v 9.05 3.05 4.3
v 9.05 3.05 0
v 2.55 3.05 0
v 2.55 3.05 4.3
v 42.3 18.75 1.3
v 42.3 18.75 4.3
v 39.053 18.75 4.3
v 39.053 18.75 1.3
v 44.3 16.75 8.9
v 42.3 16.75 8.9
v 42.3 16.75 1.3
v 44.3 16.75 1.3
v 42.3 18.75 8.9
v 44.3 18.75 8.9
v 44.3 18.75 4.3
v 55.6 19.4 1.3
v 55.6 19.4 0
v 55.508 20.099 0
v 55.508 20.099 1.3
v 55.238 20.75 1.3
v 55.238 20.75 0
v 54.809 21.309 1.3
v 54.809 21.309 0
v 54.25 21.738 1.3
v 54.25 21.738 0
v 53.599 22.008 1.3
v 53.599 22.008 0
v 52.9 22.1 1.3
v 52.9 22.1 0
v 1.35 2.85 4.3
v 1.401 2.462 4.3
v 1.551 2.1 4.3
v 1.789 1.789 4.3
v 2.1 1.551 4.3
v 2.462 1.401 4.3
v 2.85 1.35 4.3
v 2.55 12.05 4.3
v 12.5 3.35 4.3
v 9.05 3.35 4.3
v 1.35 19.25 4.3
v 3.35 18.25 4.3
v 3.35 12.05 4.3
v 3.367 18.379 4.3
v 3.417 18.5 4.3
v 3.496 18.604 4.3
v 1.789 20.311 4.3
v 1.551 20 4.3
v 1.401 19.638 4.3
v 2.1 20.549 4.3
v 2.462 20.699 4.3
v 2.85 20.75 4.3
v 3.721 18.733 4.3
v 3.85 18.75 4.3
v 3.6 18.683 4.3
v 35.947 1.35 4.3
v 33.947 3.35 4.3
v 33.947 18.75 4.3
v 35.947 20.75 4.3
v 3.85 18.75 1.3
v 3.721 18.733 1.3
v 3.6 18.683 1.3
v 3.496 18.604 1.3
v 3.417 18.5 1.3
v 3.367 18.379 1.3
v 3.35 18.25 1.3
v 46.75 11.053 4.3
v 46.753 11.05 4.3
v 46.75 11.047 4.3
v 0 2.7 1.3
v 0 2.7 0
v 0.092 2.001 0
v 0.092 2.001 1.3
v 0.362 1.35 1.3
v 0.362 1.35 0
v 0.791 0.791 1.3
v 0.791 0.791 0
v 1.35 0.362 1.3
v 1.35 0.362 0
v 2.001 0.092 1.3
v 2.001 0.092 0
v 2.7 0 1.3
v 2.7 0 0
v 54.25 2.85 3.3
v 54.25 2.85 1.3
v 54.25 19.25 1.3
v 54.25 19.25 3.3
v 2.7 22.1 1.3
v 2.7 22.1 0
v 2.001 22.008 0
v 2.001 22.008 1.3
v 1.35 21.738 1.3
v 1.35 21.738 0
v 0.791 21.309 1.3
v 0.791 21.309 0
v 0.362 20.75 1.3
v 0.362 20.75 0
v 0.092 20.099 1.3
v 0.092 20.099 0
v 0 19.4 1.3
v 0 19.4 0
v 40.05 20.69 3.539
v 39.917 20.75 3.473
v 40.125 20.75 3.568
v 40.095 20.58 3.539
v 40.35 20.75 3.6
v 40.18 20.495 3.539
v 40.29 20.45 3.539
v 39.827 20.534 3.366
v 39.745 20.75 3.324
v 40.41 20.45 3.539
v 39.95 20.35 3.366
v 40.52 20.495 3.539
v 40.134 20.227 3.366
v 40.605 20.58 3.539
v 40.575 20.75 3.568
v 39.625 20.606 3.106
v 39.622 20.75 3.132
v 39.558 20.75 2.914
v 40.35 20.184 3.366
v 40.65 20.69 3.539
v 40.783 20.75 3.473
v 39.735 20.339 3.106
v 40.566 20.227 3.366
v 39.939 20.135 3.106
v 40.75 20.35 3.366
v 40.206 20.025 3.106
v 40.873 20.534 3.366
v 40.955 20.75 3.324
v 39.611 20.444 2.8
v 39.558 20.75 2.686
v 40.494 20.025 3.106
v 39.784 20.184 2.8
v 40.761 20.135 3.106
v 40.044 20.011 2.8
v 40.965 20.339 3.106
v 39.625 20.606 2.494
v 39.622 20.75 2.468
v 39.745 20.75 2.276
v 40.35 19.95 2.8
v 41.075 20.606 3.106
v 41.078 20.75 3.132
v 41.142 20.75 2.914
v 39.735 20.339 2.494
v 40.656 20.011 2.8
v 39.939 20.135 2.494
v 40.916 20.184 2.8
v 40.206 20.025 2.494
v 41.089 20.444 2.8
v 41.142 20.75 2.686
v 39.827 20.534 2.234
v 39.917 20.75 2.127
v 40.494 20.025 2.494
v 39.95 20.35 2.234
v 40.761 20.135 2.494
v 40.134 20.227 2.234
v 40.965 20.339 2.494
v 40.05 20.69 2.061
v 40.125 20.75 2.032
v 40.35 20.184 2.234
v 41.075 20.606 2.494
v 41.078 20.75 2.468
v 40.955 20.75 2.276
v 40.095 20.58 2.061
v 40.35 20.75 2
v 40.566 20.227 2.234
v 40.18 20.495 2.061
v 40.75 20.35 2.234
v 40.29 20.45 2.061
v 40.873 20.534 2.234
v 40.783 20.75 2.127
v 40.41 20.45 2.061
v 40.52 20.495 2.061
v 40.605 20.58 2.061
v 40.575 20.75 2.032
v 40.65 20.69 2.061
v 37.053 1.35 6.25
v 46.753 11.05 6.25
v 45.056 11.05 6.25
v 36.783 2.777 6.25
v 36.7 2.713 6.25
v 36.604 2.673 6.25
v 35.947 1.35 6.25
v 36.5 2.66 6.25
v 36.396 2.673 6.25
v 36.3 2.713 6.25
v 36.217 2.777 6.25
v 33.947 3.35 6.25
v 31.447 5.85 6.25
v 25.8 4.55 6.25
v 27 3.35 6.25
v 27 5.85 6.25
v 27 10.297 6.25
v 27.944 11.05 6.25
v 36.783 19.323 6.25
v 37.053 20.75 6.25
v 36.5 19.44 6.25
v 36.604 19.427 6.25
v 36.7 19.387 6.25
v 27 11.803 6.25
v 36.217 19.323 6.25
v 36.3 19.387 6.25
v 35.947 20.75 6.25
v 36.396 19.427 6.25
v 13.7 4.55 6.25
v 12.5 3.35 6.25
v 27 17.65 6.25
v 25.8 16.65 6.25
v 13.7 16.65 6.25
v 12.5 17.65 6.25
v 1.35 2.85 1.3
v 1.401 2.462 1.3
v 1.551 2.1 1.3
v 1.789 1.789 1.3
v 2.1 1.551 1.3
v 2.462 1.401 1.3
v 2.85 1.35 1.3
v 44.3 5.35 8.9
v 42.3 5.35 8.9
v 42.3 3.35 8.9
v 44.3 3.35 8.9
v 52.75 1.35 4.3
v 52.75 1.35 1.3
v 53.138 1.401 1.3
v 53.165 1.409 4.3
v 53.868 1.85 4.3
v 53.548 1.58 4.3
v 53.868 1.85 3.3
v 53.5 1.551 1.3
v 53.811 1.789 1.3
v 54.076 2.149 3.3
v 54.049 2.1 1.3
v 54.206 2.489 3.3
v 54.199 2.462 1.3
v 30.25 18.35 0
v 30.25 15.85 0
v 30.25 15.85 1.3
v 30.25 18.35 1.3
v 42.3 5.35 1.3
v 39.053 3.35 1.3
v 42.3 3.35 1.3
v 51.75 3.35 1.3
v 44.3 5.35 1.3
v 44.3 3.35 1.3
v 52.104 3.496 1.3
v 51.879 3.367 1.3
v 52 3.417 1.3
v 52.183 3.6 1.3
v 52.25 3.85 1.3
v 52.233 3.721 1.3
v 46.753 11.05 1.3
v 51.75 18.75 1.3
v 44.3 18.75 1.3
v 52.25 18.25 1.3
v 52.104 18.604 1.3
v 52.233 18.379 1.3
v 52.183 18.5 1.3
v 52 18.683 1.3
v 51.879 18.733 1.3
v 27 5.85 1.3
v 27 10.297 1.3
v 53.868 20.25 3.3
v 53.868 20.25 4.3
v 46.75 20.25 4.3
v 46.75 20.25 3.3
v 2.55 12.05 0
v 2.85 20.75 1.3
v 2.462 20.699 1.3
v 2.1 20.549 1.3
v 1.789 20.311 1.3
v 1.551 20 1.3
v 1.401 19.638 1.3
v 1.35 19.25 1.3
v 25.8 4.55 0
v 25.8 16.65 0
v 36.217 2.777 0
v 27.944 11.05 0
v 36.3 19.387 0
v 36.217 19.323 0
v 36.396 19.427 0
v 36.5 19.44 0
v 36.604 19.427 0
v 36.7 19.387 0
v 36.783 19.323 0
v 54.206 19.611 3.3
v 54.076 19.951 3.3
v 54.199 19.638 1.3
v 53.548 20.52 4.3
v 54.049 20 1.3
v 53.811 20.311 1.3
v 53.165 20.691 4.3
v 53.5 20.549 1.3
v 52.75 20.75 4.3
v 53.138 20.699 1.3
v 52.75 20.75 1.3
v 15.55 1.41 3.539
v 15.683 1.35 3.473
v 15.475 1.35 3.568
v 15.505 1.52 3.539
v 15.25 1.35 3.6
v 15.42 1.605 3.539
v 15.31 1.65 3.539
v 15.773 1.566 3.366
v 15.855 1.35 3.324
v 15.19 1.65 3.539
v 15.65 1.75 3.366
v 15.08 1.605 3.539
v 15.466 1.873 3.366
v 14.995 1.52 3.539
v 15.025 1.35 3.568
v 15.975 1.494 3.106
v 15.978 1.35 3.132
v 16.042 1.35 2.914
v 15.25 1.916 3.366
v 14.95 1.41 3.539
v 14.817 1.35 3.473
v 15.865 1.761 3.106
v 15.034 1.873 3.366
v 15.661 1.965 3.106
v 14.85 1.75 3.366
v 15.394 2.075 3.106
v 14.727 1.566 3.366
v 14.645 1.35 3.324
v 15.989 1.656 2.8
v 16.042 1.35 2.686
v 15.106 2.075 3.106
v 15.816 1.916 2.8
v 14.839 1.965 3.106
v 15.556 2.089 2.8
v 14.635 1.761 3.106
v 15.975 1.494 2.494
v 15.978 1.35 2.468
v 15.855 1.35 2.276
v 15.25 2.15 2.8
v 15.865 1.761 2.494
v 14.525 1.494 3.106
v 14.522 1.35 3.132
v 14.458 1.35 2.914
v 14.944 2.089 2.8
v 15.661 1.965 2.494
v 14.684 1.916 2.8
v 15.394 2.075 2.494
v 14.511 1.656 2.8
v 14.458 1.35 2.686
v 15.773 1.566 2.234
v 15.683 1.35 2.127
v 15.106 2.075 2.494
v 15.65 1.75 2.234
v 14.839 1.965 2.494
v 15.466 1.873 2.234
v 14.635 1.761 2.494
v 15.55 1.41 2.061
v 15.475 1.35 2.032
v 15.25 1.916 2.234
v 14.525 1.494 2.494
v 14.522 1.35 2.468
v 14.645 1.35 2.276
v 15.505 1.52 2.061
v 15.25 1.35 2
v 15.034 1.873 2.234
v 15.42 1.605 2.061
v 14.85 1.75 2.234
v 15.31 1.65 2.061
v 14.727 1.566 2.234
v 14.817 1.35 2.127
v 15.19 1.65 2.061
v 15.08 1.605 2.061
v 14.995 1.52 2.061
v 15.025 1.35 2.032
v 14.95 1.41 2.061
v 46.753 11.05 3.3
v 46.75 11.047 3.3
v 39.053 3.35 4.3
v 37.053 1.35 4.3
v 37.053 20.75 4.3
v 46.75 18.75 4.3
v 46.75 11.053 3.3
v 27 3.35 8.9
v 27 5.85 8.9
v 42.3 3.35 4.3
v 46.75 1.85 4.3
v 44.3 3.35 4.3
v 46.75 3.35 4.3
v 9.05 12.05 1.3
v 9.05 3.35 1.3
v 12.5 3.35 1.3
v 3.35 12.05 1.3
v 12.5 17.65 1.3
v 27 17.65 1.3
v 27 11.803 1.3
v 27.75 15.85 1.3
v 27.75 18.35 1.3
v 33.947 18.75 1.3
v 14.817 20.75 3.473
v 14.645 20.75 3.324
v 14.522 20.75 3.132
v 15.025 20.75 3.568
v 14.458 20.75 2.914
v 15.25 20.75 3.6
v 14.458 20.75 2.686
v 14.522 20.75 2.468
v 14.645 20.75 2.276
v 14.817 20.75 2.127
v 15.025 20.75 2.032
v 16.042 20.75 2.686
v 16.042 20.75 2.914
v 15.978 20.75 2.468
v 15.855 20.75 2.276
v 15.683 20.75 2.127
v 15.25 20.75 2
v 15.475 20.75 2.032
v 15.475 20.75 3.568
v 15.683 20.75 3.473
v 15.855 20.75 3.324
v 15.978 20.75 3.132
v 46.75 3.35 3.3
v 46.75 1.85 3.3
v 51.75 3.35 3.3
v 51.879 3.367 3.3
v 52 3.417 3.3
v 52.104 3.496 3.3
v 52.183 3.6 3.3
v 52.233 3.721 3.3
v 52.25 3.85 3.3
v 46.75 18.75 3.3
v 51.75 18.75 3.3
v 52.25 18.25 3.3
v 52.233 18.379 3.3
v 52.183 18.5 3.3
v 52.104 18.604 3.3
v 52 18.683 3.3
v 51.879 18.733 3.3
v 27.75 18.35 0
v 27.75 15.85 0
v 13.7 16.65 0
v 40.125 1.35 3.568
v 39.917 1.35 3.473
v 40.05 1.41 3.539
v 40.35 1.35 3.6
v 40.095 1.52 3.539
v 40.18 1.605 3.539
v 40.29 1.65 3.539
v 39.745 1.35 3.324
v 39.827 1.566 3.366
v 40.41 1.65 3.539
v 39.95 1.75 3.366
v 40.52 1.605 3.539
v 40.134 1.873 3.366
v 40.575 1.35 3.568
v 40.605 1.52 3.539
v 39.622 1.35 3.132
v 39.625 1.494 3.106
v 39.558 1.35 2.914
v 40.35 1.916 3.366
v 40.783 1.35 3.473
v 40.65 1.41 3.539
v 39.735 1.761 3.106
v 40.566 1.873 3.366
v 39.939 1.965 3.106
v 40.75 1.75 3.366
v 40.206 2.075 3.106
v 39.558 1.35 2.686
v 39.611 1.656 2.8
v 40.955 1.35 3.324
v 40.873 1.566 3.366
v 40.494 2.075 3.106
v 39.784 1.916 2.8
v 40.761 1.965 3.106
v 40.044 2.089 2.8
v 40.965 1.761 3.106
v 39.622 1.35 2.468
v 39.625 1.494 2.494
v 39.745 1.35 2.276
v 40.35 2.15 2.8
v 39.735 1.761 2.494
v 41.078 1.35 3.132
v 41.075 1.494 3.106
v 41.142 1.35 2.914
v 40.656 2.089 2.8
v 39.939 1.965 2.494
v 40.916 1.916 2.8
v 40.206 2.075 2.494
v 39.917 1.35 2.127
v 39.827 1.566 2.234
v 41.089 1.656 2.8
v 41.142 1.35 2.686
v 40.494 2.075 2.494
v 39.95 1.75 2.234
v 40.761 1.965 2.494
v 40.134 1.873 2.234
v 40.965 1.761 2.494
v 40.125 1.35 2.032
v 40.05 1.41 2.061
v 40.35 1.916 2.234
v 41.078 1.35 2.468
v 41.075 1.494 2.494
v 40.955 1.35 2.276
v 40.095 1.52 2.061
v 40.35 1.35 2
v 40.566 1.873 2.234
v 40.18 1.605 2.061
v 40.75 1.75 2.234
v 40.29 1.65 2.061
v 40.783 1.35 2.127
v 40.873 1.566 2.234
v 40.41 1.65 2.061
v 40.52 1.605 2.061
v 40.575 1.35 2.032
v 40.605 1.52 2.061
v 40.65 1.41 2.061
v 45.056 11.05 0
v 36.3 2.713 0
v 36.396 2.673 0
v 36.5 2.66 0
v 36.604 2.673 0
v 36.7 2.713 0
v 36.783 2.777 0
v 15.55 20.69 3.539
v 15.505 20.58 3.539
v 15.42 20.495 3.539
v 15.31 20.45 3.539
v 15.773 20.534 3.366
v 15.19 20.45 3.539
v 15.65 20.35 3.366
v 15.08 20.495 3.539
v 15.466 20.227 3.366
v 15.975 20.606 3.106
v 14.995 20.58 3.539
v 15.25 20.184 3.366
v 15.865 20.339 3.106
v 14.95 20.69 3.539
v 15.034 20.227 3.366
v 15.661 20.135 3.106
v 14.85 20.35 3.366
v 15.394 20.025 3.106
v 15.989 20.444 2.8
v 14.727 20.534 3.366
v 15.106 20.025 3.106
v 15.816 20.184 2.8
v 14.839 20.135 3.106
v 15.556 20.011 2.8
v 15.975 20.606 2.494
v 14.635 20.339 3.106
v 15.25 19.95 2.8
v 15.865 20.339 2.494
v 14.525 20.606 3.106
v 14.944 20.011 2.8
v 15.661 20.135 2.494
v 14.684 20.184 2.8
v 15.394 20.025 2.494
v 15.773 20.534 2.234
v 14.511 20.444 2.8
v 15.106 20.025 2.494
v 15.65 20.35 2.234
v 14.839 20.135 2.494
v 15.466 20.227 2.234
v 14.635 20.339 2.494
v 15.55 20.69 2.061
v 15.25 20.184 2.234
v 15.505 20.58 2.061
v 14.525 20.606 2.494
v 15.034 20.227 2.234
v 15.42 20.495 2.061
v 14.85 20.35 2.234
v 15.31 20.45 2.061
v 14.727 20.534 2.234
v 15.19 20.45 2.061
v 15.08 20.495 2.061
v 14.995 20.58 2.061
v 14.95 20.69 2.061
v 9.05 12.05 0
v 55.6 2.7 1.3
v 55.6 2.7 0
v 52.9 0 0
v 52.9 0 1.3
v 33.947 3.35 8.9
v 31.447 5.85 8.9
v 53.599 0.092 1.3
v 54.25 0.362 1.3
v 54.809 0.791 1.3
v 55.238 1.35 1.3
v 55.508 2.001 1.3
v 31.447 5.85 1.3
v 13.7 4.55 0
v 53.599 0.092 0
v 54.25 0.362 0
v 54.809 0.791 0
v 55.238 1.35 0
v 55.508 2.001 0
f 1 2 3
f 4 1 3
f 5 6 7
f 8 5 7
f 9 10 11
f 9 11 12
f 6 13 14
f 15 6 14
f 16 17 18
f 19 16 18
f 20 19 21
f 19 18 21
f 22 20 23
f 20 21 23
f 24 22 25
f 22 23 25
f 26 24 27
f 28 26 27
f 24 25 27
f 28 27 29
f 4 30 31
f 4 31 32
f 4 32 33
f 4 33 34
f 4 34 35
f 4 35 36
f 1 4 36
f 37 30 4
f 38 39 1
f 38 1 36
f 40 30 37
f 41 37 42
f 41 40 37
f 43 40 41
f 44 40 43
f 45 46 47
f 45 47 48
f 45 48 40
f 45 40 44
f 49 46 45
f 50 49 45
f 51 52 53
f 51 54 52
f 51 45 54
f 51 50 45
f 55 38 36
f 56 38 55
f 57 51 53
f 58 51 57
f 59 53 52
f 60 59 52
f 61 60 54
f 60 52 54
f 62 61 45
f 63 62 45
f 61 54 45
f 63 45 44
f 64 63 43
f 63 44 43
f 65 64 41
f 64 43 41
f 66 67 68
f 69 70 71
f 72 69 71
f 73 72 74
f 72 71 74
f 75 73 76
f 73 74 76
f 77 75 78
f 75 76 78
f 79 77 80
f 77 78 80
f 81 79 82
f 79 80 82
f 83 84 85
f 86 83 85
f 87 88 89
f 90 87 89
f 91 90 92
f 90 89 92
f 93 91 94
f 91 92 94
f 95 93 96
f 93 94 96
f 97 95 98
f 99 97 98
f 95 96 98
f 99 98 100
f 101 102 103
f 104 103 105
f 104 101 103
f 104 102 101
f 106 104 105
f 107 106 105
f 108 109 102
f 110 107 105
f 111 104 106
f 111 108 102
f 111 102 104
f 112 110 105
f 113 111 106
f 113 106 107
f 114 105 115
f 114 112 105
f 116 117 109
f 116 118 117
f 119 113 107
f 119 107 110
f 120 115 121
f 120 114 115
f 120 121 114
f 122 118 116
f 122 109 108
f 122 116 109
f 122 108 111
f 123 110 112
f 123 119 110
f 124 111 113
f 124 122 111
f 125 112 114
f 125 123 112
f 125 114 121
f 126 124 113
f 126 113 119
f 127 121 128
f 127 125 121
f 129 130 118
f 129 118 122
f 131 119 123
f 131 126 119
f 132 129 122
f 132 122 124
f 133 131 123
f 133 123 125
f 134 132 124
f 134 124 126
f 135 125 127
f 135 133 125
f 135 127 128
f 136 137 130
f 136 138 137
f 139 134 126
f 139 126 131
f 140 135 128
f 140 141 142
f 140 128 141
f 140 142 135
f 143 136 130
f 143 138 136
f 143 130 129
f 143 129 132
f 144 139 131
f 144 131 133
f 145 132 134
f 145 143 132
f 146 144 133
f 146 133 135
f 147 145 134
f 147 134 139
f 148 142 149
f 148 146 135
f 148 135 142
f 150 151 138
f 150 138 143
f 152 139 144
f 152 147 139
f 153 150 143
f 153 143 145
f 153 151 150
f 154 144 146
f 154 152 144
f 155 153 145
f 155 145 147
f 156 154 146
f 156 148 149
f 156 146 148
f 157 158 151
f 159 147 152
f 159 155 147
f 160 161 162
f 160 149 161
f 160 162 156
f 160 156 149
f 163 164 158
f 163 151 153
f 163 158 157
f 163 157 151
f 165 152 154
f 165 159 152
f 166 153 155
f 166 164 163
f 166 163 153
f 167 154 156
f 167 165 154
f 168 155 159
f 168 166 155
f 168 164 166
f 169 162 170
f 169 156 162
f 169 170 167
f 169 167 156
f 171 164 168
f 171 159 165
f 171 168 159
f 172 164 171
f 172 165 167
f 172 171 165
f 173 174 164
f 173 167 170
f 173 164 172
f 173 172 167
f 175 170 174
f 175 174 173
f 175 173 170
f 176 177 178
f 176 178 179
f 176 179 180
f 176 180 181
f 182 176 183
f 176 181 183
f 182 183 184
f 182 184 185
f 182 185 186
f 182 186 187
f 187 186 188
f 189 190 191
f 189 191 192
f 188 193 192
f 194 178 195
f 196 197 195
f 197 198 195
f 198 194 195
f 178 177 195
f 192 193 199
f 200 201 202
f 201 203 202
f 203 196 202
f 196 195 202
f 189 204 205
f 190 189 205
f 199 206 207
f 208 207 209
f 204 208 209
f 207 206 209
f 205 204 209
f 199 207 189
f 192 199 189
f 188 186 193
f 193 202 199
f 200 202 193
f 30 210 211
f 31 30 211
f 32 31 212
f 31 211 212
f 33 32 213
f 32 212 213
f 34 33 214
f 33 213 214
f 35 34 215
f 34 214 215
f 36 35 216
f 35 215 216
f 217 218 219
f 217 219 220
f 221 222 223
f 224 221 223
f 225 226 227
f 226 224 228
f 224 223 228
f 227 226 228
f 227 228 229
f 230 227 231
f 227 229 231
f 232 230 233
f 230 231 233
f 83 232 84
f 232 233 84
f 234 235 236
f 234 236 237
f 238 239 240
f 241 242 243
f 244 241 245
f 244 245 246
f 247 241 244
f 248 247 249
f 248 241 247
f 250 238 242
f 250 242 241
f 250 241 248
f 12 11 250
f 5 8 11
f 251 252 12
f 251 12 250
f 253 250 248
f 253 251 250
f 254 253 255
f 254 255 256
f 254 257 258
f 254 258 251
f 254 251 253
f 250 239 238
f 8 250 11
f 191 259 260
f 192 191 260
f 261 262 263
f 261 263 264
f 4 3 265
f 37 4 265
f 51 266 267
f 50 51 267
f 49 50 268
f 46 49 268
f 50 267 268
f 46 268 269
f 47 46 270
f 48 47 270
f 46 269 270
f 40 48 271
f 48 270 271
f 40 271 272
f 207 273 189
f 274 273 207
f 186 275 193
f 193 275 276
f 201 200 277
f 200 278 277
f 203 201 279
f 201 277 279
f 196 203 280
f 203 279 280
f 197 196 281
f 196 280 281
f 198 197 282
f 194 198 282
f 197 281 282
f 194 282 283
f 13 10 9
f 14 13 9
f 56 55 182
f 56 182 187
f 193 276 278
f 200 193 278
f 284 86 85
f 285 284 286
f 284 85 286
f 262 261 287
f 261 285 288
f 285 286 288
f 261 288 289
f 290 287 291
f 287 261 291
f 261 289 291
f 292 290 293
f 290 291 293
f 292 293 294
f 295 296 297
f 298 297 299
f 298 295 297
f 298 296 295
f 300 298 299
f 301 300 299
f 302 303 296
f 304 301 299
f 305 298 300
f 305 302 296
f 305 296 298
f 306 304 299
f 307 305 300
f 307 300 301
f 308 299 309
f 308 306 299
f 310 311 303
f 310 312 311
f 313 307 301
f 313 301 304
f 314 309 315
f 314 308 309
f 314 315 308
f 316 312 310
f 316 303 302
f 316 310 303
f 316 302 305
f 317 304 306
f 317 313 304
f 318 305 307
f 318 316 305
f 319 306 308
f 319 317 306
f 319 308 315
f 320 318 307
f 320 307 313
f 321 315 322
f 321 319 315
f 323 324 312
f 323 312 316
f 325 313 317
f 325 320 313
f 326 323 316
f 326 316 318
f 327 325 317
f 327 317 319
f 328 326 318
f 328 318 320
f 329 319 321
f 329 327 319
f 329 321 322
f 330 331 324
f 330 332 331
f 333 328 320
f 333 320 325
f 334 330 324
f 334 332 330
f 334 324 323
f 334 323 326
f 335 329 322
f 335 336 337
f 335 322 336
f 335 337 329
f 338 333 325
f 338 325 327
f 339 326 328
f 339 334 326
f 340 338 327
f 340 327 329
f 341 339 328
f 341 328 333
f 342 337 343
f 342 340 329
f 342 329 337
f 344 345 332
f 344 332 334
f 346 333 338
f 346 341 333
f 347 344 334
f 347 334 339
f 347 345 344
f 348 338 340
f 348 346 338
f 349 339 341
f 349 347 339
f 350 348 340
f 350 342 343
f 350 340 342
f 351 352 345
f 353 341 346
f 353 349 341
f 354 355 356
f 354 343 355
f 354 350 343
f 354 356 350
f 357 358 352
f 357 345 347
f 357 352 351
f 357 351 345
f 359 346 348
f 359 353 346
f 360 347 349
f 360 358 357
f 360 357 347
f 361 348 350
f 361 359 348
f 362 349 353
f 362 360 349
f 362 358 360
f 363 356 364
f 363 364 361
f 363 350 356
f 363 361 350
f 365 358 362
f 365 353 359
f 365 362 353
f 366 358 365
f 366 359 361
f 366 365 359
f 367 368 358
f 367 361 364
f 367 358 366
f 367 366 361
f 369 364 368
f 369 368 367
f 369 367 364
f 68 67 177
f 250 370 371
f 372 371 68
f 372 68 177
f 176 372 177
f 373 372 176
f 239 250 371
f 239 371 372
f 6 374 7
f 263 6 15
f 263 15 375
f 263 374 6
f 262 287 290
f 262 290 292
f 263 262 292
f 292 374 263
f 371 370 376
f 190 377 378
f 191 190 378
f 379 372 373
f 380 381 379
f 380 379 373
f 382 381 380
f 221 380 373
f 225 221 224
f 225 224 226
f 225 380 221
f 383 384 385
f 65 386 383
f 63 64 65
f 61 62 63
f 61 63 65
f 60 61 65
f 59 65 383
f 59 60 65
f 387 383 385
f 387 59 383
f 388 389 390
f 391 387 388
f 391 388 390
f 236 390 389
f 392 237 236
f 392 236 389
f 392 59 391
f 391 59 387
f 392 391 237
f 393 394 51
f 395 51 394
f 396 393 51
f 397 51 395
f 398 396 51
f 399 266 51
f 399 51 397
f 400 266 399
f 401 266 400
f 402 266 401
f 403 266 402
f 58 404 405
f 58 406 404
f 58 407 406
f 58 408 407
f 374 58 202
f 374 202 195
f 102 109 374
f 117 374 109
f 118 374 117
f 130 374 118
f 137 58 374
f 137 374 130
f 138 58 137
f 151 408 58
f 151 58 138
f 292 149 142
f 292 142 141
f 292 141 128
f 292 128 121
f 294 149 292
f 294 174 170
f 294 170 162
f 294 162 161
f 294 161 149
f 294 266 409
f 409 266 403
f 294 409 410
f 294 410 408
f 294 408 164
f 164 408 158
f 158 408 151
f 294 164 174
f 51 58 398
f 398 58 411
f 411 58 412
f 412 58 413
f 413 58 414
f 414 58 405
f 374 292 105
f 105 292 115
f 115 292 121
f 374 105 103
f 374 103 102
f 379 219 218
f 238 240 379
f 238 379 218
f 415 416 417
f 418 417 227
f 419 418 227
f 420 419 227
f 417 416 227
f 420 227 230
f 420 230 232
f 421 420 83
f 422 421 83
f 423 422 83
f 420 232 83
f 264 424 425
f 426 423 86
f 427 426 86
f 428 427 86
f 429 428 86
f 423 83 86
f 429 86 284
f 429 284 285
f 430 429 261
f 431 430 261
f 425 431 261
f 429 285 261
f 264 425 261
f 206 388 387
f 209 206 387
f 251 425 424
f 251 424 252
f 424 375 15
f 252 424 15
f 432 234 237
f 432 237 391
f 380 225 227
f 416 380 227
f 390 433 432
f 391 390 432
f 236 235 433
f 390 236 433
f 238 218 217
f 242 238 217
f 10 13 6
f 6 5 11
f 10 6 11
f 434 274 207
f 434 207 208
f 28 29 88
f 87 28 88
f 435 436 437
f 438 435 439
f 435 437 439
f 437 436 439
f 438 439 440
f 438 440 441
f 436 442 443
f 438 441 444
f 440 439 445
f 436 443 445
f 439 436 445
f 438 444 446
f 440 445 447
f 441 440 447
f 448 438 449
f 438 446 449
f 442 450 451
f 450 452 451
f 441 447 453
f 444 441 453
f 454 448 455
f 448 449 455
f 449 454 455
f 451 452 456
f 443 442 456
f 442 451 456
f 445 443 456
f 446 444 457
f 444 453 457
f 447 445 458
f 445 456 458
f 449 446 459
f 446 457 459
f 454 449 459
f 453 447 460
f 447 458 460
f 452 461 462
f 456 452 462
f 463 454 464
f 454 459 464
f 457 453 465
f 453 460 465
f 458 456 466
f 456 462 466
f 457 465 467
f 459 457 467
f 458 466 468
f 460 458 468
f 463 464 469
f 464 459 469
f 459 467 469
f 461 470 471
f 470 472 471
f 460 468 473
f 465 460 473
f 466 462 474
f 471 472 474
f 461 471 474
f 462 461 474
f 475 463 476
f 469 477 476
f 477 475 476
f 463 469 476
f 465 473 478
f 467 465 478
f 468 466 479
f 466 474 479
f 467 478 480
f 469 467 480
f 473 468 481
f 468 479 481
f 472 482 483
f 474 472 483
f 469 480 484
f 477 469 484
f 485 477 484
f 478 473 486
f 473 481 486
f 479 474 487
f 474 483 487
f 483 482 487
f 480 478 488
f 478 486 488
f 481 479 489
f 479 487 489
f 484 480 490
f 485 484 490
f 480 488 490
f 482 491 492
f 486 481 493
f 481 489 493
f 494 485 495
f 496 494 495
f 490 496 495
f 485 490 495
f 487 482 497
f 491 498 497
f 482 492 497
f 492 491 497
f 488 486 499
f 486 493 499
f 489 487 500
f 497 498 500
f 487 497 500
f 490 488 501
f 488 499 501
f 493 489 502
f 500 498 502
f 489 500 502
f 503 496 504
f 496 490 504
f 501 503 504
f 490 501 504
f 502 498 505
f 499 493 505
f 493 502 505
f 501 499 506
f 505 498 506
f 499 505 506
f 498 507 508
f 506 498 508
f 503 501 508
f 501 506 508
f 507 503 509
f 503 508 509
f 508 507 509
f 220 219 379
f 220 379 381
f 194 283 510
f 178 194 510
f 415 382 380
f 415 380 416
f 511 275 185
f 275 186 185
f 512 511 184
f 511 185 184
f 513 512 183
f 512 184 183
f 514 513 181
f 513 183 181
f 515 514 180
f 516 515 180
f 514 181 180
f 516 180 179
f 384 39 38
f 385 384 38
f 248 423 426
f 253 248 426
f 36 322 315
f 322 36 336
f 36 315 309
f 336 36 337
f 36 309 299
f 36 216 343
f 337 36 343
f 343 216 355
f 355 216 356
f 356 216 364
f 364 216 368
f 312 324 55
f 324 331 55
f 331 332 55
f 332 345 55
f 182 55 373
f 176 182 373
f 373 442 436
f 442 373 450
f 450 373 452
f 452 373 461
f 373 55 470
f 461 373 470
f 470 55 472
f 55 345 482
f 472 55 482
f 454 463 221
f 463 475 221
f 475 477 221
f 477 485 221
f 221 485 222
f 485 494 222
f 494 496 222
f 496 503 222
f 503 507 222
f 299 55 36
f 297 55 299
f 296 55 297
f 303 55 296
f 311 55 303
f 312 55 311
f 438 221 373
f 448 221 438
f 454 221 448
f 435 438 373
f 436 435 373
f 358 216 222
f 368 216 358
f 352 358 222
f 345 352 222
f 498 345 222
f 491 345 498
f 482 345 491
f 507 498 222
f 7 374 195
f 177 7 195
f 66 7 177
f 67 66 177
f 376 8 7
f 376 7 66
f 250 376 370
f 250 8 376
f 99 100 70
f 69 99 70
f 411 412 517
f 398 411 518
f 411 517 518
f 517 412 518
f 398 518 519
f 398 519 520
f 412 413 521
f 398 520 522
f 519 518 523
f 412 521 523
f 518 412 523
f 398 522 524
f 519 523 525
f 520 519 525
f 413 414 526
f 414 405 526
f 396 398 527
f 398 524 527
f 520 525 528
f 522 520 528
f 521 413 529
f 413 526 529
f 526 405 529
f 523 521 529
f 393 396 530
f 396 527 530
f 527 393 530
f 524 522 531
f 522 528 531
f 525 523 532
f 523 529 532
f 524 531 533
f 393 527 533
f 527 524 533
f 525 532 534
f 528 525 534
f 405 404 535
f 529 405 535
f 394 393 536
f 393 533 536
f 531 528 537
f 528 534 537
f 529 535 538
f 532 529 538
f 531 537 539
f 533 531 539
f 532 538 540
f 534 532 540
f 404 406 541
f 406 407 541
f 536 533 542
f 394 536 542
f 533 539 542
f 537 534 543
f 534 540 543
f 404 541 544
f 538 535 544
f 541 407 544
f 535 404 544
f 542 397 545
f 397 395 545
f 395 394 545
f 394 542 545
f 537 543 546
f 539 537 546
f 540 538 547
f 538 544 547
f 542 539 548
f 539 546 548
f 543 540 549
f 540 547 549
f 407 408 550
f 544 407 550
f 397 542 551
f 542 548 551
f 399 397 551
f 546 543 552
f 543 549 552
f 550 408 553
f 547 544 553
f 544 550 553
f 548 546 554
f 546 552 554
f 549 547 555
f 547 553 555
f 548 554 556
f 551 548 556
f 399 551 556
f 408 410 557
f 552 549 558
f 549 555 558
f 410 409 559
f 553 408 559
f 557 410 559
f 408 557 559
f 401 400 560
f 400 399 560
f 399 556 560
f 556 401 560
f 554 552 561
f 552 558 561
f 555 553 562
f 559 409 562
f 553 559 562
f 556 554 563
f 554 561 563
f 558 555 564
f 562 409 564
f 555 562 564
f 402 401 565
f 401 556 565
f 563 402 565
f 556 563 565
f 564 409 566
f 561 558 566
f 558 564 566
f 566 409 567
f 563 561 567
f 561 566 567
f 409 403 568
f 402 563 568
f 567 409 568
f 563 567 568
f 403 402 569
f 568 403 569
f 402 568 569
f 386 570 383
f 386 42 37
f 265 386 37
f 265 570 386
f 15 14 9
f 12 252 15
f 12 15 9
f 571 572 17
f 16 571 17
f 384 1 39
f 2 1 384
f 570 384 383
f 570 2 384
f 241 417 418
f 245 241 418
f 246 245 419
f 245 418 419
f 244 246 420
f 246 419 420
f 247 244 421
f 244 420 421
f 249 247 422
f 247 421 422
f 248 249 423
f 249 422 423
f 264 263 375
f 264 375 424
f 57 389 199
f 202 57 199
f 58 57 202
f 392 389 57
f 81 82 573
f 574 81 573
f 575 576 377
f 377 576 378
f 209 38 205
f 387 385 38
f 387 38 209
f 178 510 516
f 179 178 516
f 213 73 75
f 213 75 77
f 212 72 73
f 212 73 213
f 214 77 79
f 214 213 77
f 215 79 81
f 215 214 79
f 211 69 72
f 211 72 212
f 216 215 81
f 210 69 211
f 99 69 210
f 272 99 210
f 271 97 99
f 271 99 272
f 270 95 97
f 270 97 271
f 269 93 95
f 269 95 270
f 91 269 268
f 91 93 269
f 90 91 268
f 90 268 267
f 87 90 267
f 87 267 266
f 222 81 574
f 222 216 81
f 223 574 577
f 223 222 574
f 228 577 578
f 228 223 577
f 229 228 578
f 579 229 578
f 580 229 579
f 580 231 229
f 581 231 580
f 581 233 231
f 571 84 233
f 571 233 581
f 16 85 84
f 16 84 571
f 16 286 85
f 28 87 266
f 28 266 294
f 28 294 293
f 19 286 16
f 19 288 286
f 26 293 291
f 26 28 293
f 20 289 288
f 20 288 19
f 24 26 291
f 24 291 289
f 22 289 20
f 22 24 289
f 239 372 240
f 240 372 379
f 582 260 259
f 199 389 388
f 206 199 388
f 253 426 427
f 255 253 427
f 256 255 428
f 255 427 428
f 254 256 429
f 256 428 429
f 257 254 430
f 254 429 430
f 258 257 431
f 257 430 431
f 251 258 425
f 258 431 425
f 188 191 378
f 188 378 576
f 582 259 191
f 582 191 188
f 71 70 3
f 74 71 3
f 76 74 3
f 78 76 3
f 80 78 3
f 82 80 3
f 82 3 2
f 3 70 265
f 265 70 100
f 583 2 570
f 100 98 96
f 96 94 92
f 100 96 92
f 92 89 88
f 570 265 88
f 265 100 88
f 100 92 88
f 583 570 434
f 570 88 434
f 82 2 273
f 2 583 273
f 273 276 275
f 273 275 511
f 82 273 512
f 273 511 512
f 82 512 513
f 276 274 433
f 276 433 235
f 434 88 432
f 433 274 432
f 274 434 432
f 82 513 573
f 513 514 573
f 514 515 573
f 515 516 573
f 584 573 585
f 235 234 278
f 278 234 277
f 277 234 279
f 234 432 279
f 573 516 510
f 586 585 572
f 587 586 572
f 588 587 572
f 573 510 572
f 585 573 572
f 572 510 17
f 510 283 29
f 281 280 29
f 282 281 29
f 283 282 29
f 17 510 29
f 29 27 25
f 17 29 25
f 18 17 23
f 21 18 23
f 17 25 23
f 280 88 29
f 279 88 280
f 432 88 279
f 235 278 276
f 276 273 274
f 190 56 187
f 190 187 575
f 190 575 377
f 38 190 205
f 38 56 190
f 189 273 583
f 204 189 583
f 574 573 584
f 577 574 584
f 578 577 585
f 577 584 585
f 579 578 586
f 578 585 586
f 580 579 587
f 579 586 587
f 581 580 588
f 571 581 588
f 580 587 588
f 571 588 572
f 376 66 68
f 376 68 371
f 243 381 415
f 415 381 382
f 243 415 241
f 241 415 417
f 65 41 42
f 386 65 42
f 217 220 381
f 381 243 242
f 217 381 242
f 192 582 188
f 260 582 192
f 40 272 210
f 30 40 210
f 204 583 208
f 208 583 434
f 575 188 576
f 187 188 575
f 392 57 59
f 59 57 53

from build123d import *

# Parameters (mm, degrees)
BOSS_EXTRUDE1_DEPTH = 1.3
BOSS_EXTRUDE3_DEPTH = 3
CUT_EXTRUDE1_DEPTH  = 3
SKETCH11_W          = 6.5
SKETCH11_H          = 9
CUT_EXTRUDE2_DEPTH  = 4.3
SKETCH12_W          = 12.1
SKETCH12_H          = 12.1
CUT_EXTRUDE4_DEPTH  = 1.3
SKETCH17_W          = 14.5
SKETCH17_H          = 14.3
SKETCH17_W_2        = 12.1
SKETCH17_H_2        = 12.1
BOSS_EXTRUDE4_DEPTH = 6.25
CUT_EXTRUDE5_DEPTH  = 4.3
BOSS_EXTRUDE5_DEPTH = 6.25
CUT_EXTRUDE6_START  = -3
CUT_EXTRUDE6_DEPTH  = 23
SKETCH21_W          = 2.5
SKETCH21_H          = 2.5
CUT_EXTRUDE7_DEPTH  = 10
BOSS_EXTRUDE7_DEPTH = 7.6
SKETCH25_W          = 2
SKETCH25_H          = 2
BOSS_EXTRUDE8_DEPTH = 7.6
SKETCH27_W          = 1
SKETCH27_H          = 18.4
CUT_EXTRUDE8_DEPTH  = 7.5
FILLET1_R           = 0.4


with BuildPart() as part:
    # Sketch1 → Boss-Extrude1 (new body)
    with BuildSketch(Plane.XY):
        with BuildLine():
            Line((2.7, 0), (52.9, 0))
            ThreePointArc((52.9, 0), (54.809188309, 0.790811691), (55.6, 2.7))
            Line((55.6, 2.7), (55.6, 19.4))
            ThreePointArc((55.6, 19.4), (54.809188309, 21.309188309), (52.9, 22.1))
            Line((52.9, 22.1), (2.7, 22.1))
            ThreePointArc((2.7, 22.1), (0.790811691, 21.309188309), (0, 19.4))
            Line((0, 19.4), (0, 2.7))
            ThreePointArc((0, 2.7), (0.790811691, 0.790811691), (2.7, 0))
        make_face()
    extrude(amount=BOSS_EXTRUDE1_DEPTH)

    # Sketch4 → Boss-Extrude3 (add)
    with BuildSketch(Plane.XY.offset(1.3)):
        with BuildLine():
            Line((54.25, 2.85), (54.25, 19.25))
            ThreePointArc((54.25, 19.25), (53.810660172, 20.310660172), (52.75, 20.75))
            Line((52.75, 20.75), (2.85, 20.75))
            ThreePointArc((2.85, 20.75), (1.789339828, 20.310660172), (1.35, 19.25))
            Line((1.35, 19.25), (1.35, 2.85))
            ThreePointArc((1.35, 2.85), (1.789339828, 1.789339828), (2.85, 1.35))
            Line((2.85, 1.35), (52.75, 1.35))
            ThreePointArc((52.75, 1.35), (53.810660172, 1.789339828), (54.25, 2.85))
        make_face()
    extrude(amount=BOSS_EXTRUDE3_DEPTH)

    # Sketch5 → Cut-Extrude1 (cut)
    with BuildSketch(Plane.XY.offset(4.3)):
        with BuildLine():
            Line((51.75, 18.75), (3.85, 18.75))
            ThreePointArc((3.85, 18.75), (3.496446609, 18.603553391), (3.35, 18.25))
            Line((3.35, 18.25), (3.35, 3.85))
            ThreePointArc((3.35, 3.85), (3.496446609, 3.496446609), (3.85, 3.35))
            Line((3.85, 3.35), (51.75, 3.35))
            ThreePointArc((51.75, 3.35), (52.103553391, 3.496446609), (52.25, 3.85))
            Line((52.25, 3.85), (52.25, 18.25))
            ThreePointArc((52.25, 18.25), (52.103553391, 18.603553391), (51.75, 18.75))
        make_face()
    extrude(amount=-CUT_EXTRUDE1_DEPTH, mode=Mode.SUBTRACT)

    # Sketch10 → Cut-Revolve1 (revolve, cut)
    with BuildSketch(Plane(origin=(0, 20.75, 0), x_dir=(1, 0, 0), z_dir=(0, 1, 0))):
        with BuildLine():
            Line((40.35, -2), (40.35, -3.6))
            ThreePointArc((40.35, -3.6), (39.55, -2.8), (40.35, -2))
        make_face()
    cut_revolve1 = revolve(axis=Axis((40.35, 20.75, 2), (0, 0, 1)), mode=Mode.SUBTRACT)

    # Mirror1: Cut-Revolve1 across plane
    add(cut_revolve1.mirror(Plane(origin=(0, 11.05, 0), x_dir=(0, 0, 1), z_dir=(0, -1, 0))), mode=Mode.SUBTRACT)

    # Sketch11 → Cut-Extrude2 (cut)
    with BuildSketch(Plane(origin=(0, 0, 0), x_dir=(-1, 0, 0), z_dir=(0, 0, -1))):
        with Locations((-5.8, 7.55)):
            Rectangle(SKETCH11_W, SKETCH11_H)
    extrude(amount=-CUT_EXTRUDE2_DEPTH, mode=Mode.SUBTRACT)

    # Sketch12 → Cut-Extrude4 (cut)
    with BuildSketch(Plane(origin=(0, 0, 0), x_dir=(-1, 0, 0), z_dir=(0, 0, -1))):
        with Locations((-19.75, 10.6)):
            Rectangle(SKETCH12_W, SKETCH12_H)
    extrude(amount=-CUT_EXTRUDE4_DEPTH, mode=Mode.SUBTRACT)

    # Sketch17 → Boss-Extrude4 (add)
    with BuildSketch(Plane(origin=(0, 0, 0), x_dir=(-1, 0, 0), z_dir=(0, 0, -1))):
        with Locations((-19.75, 10.5)):
            Rectangle(SKETCH17_W, SKETCH17_H)
        with Locations((-19.75, 10.6)):
            Rectangle(SKETCH17_W_2, SKETCH17_H_2, mode=Mode.SUBTRACT)
    extrude(amount=-BOSS_EXTRUDE4_DEPTH)

    # Sketch13 → Cut-Extrude5 (cut)
    with BuildSketch(Plane(origin=(0, 0, 0), x_dir=(-1, 0, 0), z_dir=(0, 0, -1))):
        Polygon((-45.055992052, 11.05), (-36.5, 2.494007948), (-27.944007948, 11.05), (-36.5, 19.605992052), align=None)
    extrude(amount=-CUT_EXTRUDE5_DEPTH, mode=Mode.SUBTRACT)

    # Sketch18 → Boss-Extrude5 (add)
    with BuildSketch(Plane(origin=(0, 0, 0), x_dir=(-1, 0, 0), z_dir=(0, 0, -1))):
        Polygon((-46.753048327, 11.05), (-36.5, 0.796951673), (-26.246951673, 11.05), (-36.5, 21.303048327), align=None)
        Polygon((-36.5, 19.605992052), (-45.055992052, 11.05), (-36.5, 2.494007948), (-27.944007948, 11.05), align=None, mode=Mode.SUBTRACT)
    extrude(amount=-BOSS_EXTRUDE5_DEPTH)

    # Sketch20 → Cut-Extrude6 (cut)
    with BuildSketch(Plane.XY.offset(4.3).offset(CUT_EXTRUDE6_START)):
        Polygon((35.946951673, 20.75), (37.053048327, 20.75), (36.5, 21.303048327), align=None)
    cut_extrude6 = extrude(amount=CUT_EXTRUDE6_DEPTH, mode=Mode.SUBTRACT)

    # Mirror2: Cut-Extrude6 across plane
    add(cut_extrude6.mirror(Plane(origin=(0, 11.05, 0), x_dir=(0, 0, 1), z_dir=(0, -1, 0))), mode=Mode.SUBTRACT)

    # Sketch21 → Cut-Extrude7 (cut)
    with BuildSketch(Plane(origin=(0, 0, 0), x_dir=(-1, 0, 0), z_dir=(0, 0, -1))):
        with Locations((-29, 17.1)):
            Rectangle(SKETCH21_W, SKETCH21_H)
    extrude(amount=-CUT_EXTRUDE7_DEPTH, mode=Mode.SUBTRACT)

    # Mirror3: Cut-Revolve1 across plane
    add(cut_revolve1.mirror(Plane.ZY.offset(-27.8)), mode=Mode.SUBTRACT)

    # Mirror3 copy 1 sketch → Mirror3 copy 1 (revolve, cut)
    with BuildSketch(Plane(origin=(55.6, 1.35, 0), x_dir=(-1, 0, 0), z_dir=(0, -1, 0))):
        with BuildLine():
            Line((40.35, -2), (40.35, -3.6))
            ThreePointArc((40.35, -3.6), (39.55, -2.8), (40.35, -2))
        make_face()
    revolve(axis=Axis((15.25, 1.35, 2), (0, 0, 1)), mode=Mode.SUBTRACT)

    # Sketch24 → Boss-Extrude7 (add)
    with BuildSketch(Plane.XY.offset(1.3)):
        Polygon((33.946951673, 3.35), (27, 3.35), (27, 5.85), (31.446951673, 5.85), align=None)
    extrude(amount=BOSS_EXTRUDE7_DEPTH)

    # Sketch25 → Boss-Extrude8 (add)
    with BuildSketch(Plane.XY.offset(1.3)):
        with Locations((43.3, 4.35)):
            Rectangle(SKETCH25_W, SKETCH25_H)
    boss_extrude8 = extrude(amount=BOSS_EXTRUDE8_DEPTH)

    # Mirror4: Boss-Extrude8 across plane
    add(boss_extrude8.mirror(Plane(origin=(0, 11.05, 0), x_dir=(0, 0, 1), z_dir=(0, -1, 0))))

    # Sketch27 → Cut-Extrude8 (cut)
    with BuildSketch(Plane(origin=(54.25, 0, 0), x_dir=(0, 0, -1), z_dir=(1, 0, 0))):
        with Locations((-3.8, 11.05)):
            Rectangle(SKETCH27_W, SKETCH27_H)
    extrude(amount=-CUT_EXTRUDE8_DEPTH, mode=Mode.SUBTRACT)

    # Fillet1
    fillet1_edges = [part.edges().sort_by_distance(p)[0] for p in [
        (36.5, 19.605992052, 3.125),
        (36.5, 2.494007948, 3.125),
    ]]
    fillet(fillet1_edges, radius=FILLET1_R)


solid = part.part
